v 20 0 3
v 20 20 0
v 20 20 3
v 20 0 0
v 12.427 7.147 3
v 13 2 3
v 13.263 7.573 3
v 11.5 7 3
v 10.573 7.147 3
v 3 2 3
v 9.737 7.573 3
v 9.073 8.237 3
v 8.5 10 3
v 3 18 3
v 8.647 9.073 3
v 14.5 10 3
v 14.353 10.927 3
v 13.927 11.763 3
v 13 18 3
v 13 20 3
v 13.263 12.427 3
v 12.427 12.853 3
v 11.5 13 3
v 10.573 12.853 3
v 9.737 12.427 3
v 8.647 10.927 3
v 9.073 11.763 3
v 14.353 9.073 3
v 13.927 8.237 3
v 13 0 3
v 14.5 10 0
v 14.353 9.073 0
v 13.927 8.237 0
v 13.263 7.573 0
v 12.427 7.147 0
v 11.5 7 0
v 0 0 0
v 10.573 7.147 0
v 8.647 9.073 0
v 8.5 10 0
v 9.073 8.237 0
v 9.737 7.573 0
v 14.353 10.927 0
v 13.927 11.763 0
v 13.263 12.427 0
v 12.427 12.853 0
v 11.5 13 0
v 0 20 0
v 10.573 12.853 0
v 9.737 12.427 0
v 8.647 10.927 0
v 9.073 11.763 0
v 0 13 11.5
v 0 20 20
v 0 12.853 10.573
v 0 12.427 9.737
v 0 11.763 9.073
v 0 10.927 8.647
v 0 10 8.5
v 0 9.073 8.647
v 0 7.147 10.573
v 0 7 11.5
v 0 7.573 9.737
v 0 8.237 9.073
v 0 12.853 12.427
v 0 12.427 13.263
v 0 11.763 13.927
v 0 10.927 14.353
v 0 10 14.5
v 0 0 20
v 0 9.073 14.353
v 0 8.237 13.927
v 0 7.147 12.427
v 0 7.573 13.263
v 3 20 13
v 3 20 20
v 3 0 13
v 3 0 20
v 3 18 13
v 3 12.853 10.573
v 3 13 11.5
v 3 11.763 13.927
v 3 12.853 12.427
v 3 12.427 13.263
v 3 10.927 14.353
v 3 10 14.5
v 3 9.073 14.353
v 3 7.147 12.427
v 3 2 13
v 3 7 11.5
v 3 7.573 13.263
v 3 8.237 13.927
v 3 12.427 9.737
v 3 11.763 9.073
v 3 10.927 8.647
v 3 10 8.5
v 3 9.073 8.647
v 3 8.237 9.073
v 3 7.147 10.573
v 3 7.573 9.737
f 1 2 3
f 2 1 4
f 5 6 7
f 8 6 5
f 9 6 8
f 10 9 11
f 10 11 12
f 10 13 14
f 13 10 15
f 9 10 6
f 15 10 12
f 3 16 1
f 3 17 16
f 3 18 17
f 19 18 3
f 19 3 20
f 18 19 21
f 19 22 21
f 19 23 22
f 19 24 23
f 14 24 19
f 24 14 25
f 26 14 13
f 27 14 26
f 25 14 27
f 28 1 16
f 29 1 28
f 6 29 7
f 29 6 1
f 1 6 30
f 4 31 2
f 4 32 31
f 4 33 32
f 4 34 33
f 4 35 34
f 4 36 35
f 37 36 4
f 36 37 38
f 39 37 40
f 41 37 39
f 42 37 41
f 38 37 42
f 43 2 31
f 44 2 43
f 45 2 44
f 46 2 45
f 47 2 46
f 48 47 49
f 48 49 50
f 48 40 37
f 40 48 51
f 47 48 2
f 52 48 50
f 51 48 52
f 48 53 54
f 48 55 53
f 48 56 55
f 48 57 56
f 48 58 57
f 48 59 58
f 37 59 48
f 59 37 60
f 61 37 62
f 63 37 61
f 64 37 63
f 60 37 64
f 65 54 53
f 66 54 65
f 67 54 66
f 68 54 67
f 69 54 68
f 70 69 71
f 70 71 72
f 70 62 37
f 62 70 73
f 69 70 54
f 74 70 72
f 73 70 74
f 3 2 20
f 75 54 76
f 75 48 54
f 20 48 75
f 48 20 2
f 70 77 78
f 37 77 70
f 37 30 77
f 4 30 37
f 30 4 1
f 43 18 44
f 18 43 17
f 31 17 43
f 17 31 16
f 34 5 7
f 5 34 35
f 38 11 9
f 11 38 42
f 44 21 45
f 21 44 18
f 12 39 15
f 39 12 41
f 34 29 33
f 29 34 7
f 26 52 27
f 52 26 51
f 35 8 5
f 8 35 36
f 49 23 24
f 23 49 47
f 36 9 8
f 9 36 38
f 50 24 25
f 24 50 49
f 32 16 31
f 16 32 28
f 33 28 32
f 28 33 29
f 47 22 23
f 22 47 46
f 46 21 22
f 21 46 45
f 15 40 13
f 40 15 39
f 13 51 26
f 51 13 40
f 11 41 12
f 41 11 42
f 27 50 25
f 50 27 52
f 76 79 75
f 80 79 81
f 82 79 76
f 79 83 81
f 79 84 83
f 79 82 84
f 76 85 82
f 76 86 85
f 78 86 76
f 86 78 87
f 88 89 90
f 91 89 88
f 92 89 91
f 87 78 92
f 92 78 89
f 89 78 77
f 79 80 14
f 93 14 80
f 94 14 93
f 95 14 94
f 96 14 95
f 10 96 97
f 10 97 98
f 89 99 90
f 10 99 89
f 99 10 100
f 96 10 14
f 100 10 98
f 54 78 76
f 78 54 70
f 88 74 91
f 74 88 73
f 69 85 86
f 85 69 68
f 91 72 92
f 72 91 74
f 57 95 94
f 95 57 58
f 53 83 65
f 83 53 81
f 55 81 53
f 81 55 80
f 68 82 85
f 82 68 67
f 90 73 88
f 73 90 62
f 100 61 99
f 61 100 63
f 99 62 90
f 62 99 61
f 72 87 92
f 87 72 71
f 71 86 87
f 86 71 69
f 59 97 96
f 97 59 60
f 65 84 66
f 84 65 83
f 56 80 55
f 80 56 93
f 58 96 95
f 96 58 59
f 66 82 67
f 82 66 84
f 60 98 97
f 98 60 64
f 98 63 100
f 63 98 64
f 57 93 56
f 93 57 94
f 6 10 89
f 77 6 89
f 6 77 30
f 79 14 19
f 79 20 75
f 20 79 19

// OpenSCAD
// The required angle between the two plates
angle = 90; // [10:1:180]

// The width of the bracket across the bolt holes (Y)
width = 20; // [10:1:999]

// The length of each plate from apex out (X and Z)
length = 20; // [10:1:999]

// Material thickness
thickness = 3; // [1:1:10]

// The diameter of the bolt holes
bolt_diameter = 6; // [1:1:10]

// The number of bolts per plate
bolts_per_face = 1; // [1:1:10]

/* [hidden] */
$fn=20;
inside_offset = thickness/tan(angle/2);

/* fixed (horizontal) plate with clipping mask */
difference(){
    cube([length, width, thickness]);
    rotate([0, -angle, 0]){
        translate([0, -.1, 0]){
            cube([length, width+.2, thickness]);
        }
    }
    
    /* bolt holes */
    for (i = [1 : 1 : bolts_per_face]){
        translate([inside_offset+((length-inside_offset)/(bolts_per_face+1))*i, width/2, -.1]){
            cylinder(h=thickness+.2, d=bolt_diameter);
        }
    }
}

/* movable (vertical-ish) plate with clipping mask */
difference(){
    rotate([0, -angle, 0]){
        translate([0, 0, -thickness]){
            cube([length, width, thickness]);
        }
    }
    translate([0,-.1,-thickness]){
        cube([length, width+.2, thickness]);
    }
    
    /* bolt holes */
    for (i = [1 : 1 : bolts_per_face]){
        rotate([0,-angle, 0]){
            translate([inside_offset+((length-inside_offset)/(bolts_per_face+1))*i, width/2, -thickness-.1]){
                cylinder(h=thickness+.2, d=bolt_diameter);
            }
        }
    }
}

support_offset = thickness/tan(angle/2);
support_width = support_offset > (length/2) ? length-support_offset : (length/2);
echo(support_width);
/* near support */
translate([support_offset, width/10, thickness]){
    rotate([90, 0, 0]){
        triangle(support_width, support_width, width/10, false, angle);
    }
}

/* far support */
translate([support_offset, width, thickness]){
    rotate([90, 0, 0]){
        triangle(support_width, support_width, width/10, false, angle);
    }
}



/**
 * Triangle
 *
 * @param number  o_len   Length of the opposite side
 * @param number  a_len   Length of the adjacent side
 * @param number  depth   How wide/deep the triangle is in the 3rd dimension
 * @param boolean center  Whether to center the triangle on the origin
 * @param boolean o_angle The angle (default=90) between the adjacent and oposite sides
 */
module triangle(o_len, a_len, depth, center=false, adj_angle=90)
{
    centroid = center ? [-a_len/3, -o_len/3, -depth/2] : [0, 0, 0];
    translate(centroid) linear_extrude(height=depth)
    {
        polygon(points=[[0,0],[a_len,0],[sin(90-adj_angle)*o_len, cos(90-adj_angle)*o_len]], paths=[[0,1,2]]);
    }
}
